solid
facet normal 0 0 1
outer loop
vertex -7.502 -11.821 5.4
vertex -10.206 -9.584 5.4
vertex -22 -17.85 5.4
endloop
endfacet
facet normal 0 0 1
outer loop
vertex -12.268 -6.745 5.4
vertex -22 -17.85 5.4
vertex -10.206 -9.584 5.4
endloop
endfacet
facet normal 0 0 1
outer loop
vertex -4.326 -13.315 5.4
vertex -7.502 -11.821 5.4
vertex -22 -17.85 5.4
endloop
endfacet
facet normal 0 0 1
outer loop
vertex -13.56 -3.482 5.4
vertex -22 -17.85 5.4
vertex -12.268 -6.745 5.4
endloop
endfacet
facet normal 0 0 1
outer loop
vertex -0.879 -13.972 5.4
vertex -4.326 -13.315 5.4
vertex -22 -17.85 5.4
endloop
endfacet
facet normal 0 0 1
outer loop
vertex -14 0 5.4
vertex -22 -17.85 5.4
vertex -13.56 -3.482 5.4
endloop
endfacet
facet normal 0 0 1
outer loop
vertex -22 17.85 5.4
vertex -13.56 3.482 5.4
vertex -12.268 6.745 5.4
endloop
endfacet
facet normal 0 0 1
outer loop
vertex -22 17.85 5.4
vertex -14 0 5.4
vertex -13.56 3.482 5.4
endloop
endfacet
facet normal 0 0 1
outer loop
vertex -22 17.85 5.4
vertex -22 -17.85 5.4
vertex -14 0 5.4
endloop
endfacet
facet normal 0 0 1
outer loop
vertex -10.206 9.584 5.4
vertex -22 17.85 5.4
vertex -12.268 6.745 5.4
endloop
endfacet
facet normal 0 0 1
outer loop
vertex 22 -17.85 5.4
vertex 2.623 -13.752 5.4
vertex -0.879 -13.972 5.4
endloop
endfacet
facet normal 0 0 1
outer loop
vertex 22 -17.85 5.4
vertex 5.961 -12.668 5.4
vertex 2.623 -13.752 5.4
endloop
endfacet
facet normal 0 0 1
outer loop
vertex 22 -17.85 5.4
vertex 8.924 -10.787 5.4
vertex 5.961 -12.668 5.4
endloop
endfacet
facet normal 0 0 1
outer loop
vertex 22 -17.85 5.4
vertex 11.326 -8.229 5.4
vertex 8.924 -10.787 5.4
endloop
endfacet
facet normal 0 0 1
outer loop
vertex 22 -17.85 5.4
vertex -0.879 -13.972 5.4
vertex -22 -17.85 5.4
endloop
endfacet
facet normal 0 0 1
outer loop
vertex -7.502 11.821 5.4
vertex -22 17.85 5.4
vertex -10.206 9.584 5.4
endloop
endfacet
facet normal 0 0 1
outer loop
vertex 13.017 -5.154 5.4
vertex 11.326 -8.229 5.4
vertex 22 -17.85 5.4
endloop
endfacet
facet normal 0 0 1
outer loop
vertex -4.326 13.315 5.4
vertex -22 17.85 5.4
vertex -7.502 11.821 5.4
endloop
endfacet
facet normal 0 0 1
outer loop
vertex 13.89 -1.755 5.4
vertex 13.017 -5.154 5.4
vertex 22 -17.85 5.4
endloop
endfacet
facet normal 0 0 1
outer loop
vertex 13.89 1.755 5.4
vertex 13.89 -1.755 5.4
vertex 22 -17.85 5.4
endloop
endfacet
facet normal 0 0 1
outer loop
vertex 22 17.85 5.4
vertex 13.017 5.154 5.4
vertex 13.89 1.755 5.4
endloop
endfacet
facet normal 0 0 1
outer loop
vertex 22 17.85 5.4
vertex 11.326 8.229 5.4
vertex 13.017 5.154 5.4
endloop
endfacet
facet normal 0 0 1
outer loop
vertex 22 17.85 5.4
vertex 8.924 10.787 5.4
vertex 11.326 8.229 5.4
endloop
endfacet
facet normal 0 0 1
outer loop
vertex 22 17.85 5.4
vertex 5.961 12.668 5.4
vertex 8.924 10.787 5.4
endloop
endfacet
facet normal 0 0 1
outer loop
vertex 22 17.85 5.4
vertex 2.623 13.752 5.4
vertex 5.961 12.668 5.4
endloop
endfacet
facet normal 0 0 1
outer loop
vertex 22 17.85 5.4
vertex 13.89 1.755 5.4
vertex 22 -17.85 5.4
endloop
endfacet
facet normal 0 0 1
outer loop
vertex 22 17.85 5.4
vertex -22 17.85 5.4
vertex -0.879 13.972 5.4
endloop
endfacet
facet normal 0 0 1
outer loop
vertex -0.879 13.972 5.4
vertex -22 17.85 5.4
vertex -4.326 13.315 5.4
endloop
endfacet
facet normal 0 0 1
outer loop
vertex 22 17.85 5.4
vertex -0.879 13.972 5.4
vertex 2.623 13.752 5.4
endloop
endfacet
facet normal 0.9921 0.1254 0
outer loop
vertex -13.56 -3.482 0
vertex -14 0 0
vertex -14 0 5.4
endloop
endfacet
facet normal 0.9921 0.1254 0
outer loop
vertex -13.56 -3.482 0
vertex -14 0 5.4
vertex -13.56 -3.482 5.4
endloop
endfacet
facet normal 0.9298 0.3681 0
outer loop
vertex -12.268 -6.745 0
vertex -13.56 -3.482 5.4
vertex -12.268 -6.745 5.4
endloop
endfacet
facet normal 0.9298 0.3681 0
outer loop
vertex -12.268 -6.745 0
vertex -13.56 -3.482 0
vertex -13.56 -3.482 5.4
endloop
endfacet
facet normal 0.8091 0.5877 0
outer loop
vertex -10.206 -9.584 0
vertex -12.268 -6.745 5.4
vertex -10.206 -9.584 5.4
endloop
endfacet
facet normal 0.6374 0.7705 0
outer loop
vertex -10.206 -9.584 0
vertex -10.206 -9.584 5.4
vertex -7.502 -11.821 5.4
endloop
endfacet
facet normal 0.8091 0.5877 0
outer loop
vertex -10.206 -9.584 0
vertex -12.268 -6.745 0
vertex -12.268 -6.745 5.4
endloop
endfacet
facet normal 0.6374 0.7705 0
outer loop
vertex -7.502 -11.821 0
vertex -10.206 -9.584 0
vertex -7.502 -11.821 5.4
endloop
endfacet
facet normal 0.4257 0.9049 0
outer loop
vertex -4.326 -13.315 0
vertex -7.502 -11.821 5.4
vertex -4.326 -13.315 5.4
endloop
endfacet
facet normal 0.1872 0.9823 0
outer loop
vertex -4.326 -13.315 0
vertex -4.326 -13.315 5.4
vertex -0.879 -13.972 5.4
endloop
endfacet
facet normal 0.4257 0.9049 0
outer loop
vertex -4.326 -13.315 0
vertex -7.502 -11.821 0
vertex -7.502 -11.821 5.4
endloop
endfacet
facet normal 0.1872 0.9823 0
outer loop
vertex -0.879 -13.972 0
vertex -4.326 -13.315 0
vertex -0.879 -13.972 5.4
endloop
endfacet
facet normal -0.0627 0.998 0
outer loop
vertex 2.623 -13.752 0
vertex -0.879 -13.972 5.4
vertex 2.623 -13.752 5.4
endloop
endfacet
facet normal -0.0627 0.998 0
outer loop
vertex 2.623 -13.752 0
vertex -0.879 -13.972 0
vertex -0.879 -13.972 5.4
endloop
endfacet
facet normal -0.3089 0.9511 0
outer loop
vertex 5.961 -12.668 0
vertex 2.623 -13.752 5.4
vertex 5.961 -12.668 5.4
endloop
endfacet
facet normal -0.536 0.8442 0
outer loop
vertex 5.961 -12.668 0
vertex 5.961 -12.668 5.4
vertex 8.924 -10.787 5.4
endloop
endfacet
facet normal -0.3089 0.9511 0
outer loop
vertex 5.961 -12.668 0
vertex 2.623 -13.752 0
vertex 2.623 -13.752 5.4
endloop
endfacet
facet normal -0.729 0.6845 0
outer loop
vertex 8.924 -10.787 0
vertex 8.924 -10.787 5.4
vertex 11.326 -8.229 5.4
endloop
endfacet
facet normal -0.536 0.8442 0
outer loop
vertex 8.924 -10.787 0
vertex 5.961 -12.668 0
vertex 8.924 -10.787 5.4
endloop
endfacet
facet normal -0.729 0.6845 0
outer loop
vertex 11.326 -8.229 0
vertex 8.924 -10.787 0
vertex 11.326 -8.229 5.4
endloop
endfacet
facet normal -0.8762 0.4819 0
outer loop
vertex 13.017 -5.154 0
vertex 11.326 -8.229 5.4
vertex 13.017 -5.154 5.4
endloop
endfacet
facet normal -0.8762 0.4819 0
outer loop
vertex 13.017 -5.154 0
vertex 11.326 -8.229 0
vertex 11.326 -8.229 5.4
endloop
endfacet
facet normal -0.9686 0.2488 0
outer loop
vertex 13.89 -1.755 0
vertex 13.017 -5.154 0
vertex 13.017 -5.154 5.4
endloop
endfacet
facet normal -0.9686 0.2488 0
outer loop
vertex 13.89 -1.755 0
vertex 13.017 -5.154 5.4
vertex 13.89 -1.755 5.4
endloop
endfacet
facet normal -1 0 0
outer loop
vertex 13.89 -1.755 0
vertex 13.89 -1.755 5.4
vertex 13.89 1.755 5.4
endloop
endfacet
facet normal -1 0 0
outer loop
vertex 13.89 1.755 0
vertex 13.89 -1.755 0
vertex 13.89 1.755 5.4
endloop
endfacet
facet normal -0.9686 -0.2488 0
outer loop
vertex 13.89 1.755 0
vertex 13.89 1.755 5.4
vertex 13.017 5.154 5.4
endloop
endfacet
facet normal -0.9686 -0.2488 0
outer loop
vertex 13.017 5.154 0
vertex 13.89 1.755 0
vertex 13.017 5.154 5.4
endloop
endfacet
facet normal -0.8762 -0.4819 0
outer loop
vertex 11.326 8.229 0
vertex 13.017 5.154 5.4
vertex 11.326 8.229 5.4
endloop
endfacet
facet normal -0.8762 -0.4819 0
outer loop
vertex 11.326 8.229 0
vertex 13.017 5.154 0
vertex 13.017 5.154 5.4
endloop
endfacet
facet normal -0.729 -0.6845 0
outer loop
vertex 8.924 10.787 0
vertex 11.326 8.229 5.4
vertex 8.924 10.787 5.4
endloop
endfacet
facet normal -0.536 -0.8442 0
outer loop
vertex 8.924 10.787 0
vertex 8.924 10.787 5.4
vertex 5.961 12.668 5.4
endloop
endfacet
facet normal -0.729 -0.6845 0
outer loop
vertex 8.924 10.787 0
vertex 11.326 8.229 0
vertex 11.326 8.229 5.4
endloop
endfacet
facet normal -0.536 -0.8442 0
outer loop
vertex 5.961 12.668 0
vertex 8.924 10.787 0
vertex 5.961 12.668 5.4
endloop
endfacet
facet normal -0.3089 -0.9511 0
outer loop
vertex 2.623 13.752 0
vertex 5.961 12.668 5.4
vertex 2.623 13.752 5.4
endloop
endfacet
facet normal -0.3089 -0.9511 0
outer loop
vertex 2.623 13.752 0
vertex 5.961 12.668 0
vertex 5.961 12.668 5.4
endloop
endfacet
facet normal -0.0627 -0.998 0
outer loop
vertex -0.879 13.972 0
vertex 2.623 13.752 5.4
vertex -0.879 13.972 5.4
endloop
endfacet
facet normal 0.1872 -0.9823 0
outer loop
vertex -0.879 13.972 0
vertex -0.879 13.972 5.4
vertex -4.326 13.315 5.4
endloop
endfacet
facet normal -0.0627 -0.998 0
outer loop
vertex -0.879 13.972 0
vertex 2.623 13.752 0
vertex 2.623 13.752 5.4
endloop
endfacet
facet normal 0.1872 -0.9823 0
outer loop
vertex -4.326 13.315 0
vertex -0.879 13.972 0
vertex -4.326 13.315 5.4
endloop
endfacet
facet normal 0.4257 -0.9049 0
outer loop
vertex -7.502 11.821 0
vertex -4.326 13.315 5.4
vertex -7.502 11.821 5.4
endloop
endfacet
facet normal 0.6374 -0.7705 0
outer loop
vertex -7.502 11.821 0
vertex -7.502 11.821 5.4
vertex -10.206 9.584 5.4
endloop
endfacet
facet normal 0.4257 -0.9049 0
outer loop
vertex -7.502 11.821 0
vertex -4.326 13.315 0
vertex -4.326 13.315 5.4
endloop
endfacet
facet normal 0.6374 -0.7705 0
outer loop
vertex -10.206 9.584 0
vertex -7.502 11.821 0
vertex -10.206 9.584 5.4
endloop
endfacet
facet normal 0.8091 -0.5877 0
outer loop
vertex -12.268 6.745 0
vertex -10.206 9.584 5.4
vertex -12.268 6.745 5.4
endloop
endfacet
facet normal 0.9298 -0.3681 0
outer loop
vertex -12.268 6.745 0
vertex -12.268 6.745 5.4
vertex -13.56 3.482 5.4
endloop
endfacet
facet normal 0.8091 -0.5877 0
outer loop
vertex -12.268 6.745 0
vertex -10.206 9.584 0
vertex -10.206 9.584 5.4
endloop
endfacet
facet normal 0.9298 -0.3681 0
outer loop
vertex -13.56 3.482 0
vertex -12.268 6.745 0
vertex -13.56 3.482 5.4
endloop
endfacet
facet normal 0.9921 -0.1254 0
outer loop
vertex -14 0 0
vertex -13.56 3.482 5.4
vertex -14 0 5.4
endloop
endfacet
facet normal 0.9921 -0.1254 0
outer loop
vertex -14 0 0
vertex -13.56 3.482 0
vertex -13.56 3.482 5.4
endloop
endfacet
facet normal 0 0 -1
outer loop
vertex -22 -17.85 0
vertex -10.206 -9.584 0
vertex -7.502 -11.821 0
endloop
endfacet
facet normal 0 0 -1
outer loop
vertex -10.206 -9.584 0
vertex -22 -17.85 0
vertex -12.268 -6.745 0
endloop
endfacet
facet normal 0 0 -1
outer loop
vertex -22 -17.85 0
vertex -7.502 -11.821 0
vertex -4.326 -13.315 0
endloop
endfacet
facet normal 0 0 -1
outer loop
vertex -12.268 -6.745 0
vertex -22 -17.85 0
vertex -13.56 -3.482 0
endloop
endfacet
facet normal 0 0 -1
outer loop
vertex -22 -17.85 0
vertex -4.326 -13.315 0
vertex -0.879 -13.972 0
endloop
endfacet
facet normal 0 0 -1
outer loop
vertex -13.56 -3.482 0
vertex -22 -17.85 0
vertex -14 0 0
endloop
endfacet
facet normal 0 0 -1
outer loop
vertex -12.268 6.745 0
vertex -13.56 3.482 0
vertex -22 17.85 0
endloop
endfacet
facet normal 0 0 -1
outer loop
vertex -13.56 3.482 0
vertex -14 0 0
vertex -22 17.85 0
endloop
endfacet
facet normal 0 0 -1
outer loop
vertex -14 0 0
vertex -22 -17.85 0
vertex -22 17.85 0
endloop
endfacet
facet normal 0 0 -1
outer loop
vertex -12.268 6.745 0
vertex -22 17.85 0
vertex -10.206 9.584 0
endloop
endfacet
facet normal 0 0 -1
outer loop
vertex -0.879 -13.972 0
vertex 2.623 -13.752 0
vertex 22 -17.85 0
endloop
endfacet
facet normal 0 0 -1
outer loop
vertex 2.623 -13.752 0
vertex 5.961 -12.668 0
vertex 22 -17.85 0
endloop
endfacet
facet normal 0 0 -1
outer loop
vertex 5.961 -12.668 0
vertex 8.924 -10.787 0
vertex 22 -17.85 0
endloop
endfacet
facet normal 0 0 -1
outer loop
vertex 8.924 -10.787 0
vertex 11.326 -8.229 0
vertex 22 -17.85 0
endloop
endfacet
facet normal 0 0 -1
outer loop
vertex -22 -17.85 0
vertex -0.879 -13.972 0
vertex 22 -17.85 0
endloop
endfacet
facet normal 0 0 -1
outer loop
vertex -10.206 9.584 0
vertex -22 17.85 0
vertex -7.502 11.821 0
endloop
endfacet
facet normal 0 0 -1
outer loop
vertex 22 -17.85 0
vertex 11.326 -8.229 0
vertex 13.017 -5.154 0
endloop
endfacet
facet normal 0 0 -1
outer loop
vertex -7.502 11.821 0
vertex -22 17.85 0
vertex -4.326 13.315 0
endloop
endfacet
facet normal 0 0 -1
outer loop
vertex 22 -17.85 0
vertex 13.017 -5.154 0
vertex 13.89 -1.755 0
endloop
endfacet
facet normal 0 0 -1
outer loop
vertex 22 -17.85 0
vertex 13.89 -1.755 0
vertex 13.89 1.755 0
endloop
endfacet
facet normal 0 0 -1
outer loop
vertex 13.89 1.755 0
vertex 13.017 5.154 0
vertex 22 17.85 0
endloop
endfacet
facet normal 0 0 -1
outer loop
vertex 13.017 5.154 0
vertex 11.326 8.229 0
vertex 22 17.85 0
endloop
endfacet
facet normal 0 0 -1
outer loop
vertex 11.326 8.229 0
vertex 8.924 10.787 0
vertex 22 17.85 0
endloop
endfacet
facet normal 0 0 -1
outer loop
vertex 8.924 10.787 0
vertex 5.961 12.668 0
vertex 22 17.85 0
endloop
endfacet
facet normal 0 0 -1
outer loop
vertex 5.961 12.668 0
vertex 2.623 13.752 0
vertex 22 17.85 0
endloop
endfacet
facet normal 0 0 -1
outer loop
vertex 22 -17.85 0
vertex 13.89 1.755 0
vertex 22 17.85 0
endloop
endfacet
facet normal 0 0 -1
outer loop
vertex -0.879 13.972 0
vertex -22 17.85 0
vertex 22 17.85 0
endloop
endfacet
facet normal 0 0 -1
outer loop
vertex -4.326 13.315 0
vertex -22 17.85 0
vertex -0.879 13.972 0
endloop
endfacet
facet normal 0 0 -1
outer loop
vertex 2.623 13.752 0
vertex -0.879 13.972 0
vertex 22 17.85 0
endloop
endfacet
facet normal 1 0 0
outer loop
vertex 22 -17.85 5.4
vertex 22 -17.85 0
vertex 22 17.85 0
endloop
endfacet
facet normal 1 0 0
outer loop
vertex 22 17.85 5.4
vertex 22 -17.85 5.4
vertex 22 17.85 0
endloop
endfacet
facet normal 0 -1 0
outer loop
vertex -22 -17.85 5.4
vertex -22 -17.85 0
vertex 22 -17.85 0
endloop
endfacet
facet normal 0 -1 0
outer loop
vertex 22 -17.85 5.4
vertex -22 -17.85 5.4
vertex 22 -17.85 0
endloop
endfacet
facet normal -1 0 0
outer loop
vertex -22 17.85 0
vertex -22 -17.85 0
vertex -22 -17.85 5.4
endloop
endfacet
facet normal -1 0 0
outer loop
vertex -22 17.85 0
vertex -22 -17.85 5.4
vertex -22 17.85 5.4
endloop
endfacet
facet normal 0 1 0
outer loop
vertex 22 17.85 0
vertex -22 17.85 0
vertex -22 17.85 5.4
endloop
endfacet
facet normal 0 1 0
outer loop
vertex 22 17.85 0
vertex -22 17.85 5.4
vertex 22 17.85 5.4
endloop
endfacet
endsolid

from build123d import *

# Parameters (mm, degrees)
CROQUIS1_W              = 44
CROQUIS1_H              = 35.7
CROQUIS1_R              = 14
SALIENTE_EXTRUIR1_DEPTH = 5.4


with BuildPart() as part:
    # Croquis1 → Saliente-Extruir1 (new body)
    with BuildSketch(Plane.XY):
        Rectangle(CROQUIS1_W, CROQUIS1_H)
        with Locations(Location((0, 0, 0), (0, 0, 180))):
            Circle(CROQUIS1_R, mode=Mode.SUBTRACT)
    extrude(amount=SALIENTE_EXTRUIR1_DEPTH)


solid = part.part
